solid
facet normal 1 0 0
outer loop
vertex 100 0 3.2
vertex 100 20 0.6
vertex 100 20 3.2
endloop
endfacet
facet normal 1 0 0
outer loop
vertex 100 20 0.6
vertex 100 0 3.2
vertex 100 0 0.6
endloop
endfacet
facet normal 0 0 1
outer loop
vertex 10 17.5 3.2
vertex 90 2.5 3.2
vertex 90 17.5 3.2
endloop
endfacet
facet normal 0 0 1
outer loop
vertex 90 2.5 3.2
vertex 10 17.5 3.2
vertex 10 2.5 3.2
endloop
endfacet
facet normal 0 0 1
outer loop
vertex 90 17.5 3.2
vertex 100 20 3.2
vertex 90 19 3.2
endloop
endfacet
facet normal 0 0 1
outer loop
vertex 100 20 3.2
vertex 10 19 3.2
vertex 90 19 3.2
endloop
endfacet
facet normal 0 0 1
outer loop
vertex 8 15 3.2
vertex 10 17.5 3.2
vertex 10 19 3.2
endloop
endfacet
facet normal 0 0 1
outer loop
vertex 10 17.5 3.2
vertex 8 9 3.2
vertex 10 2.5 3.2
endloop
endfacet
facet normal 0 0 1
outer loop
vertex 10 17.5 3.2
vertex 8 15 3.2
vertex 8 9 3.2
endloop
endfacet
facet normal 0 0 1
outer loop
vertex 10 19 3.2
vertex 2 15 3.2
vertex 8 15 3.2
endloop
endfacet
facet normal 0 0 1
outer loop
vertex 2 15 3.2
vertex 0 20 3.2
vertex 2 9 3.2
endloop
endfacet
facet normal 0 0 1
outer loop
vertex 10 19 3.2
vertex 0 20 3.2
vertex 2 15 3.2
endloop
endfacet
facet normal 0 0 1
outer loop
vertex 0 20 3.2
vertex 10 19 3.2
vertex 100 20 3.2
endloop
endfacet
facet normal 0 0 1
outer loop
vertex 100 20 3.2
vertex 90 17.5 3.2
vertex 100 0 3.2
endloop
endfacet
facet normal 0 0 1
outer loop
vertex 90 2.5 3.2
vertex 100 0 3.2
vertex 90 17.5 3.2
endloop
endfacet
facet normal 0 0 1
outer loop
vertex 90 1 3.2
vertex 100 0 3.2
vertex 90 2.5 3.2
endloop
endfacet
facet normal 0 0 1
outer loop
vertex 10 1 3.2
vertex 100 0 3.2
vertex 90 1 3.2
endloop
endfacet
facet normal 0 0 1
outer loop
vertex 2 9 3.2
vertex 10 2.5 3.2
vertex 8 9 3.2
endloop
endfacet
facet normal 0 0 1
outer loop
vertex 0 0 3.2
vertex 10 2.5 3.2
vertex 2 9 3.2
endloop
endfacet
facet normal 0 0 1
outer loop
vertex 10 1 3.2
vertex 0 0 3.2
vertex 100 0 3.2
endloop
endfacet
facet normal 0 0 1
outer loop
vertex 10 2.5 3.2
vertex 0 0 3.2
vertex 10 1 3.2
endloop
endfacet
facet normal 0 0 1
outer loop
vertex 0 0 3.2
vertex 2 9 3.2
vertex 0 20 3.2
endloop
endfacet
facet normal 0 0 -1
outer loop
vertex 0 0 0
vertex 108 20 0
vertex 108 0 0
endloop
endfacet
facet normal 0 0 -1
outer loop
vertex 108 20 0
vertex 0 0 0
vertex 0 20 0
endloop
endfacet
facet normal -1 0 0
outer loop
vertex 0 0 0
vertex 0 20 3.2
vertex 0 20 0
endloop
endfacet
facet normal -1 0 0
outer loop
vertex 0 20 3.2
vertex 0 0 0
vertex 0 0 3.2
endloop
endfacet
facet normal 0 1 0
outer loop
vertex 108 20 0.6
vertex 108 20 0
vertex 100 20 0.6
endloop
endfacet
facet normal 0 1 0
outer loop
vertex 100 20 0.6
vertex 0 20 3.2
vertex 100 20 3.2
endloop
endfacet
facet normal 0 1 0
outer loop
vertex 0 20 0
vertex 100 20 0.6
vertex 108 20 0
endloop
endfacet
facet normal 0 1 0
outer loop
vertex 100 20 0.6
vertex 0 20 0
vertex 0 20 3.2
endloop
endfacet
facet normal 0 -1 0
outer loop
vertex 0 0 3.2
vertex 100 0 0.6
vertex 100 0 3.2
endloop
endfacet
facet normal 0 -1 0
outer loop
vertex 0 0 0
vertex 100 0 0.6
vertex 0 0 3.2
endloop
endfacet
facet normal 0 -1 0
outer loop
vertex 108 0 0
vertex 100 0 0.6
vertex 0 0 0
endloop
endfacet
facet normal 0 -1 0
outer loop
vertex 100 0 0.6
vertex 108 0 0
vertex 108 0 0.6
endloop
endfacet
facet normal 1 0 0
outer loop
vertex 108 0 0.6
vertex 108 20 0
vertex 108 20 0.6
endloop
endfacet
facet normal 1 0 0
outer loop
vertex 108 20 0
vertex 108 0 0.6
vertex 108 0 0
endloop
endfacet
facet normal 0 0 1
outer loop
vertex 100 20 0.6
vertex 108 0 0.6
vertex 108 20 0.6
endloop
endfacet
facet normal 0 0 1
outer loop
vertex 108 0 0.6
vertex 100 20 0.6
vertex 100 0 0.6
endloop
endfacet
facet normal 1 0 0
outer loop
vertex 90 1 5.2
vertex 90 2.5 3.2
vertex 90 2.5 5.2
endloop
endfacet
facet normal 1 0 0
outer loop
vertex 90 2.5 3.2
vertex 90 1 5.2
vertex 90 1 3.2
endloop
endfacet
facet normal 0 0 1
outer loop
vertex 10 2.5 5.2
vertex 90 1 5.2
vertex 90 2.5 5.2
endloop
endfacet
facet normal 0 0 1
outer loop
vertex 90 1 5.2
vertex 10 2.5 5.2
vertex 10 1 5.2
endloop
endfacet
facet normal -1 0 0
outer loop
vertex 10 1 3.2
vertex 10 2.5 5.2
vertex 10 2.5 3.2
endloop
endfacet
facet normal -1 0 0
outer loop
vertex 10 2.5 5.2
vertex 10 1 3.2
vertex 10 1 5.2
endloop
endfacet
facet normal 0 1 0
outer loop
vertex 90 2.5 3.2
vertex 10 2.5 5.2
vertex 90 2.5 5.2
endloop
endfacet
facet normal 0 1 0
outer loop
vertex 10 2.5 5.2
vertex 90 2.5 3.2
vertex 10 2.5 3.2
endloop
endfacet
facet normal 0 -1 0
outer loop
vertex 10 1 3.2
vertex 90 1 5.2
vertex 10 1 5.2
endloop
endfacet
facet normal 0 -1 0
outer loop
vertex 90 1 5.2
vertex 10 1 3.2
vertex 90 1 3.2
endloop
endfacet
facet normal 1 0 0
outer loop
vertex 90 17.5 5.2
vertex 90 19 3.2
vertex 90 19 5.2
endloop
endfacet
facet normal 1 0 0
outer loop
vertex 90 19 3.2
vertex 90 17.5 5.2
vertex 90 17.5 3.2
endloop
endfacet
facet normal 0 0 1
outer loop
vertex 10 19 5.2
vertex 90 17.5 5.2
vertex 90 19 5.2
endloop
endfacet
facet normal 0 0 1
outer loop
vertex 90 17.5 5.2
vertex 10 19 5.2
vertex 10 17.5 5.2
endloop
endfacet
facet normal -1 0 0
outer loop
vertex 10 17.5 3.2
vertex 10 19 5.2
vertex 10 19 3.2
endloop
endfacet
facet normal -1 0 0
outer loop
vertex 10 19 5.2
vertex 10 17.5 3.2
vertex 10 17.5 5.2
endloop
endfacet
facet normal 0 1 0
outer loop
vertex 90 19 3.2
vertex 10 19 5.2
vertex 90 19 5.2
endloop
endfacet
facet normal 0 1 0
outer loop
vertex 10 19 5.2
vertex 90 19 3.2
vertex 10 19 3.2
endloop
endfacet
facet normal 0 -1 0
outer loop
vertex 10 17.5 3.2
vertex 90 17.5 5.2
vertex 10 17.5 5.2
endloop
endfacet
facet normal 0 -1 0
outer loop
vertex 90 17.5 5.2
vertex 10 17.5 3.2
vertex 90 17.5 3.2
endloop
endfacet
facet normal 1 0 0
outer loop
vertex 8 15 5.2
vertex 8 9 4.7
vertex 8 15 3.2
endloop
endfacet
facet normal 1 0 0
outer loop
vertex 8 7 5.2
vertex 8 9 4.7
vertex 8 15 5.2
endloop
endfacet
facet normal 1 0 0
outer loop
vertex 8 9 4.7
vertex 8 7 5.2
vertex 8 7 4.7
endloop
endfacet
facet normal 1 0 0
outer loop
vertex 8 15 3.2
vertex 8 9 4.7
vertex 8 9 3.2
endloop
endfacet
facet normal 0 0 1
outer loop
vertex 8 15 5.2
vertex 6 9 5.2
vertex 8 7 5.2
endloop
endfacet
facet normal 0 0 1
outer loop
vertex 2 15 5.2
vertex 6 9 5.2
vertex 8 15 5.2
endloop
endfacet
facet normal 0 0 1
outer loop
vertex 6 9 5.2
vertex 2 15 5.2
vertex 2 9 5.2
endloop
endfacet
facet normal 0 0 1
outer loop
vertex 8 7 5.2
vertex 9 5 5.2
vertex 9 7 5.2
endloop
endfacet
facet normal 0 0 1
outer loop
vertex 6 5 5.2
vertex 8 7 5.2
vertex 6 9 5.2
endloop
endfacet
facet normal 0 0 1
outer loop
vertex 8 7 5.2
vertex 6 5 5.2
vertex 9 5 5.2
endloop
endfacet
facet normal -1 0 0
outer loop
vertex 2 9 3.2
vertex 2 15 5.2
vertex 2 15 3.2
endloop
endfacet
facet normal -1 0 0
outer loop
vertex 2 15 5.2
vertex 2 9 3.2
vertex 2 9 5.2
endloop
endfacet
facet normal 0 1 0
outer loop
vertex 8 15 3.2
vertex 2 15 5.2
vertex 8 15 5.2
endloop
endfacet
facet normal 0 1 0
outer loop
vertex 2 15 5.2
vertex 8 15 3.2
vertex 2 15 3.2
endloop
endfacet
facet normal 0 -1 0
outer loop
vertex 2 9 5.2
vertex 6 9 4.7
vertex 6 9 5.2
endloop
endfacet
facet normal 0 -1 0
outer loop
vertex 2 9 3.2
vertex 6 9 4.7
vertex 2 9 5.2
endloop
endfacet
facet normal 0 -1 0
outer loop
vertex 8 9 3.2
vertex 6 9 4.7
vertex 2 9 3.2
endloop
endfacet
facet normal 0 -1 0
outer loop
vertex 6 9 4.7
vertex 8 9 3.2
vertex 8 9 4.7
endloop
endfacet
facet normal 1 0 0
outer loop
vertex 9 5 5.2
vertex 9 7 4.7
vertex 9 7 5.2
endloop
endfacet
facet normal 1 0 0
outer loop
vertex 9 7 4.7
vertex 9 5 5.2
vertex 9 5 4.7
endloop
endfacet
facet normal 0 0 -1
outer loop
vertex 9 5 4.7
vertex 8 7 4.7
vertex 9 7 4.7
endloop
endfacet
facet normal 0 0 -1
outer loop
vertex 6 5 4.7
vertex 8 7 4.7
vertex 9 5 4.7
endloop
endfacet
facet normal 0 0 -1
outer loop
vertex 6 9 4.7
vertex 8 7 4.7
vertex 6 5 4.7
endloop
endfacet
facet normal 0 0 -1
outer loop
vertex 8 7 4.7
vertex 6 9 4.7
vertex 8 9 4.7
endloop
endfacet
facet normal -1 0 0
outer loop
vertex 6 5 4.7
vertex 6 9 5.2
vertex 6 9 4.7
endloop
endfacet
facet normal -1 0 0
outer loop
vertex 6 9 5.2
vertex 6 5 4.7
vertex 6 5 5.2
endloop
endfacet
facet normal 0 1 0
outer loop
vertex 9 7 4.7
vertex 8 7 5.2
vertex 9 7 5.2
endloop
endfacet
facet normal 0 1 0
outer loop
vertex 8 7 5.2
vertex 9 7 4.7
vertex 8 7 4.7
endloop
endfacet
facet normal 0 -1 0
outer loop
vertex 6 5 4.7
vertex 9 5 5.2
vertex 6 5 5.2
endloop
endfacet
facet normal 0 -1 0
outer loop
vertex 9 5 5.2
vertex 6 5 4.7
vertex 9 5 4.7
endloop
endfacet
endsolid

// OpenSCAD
// Bag clip living hinge, PETG, 0.4 nozzle, no supports.
// Two halves contacting at hinge, open flat print pose.
// Fold: rotate upper 180 about [108,10,5.2] -Y. F(x)=216-x, F(z)=10.4-z.

part = "arm_lower"; // [arm_lower, arm_upper, assembly]
cadverify_only = "";

module instance(name, part, unit = 1) {
    echo(cadverify_instance = [name, part, unit]);
    if (cadverify_only == "" || cadverify_only == name) children();
}

module arm_lower() {
    cube([100, 20, 3.2], false);
    translate([99.9, 0, 0]) cube([8.1, 20, 0.6], false);
    translate([10, 1, 3.1]) cube([80, 1.5, 2.1], false);
    translate([10, 17.5, 3.1]) cube([80, 1.5, 2.1], false);
    // stop tower (central)
    translate([2, 9, 3.1]) cube([6, 6, 2.1], false);
    // lower hook base region uses body; hook lip + bridge
    translate([6, 5, 4.7]) cube([3, 2, 0.5], false);
    translate([6, 6.9, 4.7]) cube([2, 2.2, 0.5], false);
}

module arm_upper() {
    cube([8.2, 20, 0.6], false);
    translate([7.9, 0, 0]) cube([100.1, 20, 3.2], false);
    // stop tower (central) local x 102-106 -> folded 2-6
    translate([102, 9, 3.1]) cube([4, 6, 2.1], false);
    // upper hook post (Y 13-15) tall
    translate([102, 13, 3.1]) cube([4, 2, 3.3], false);
    // Y bridge 7-13
    translate([99, 6.9, 5.8]) cube([3.1, 6.2, 0.6], false);
    // upper hook lip (Y 5-7)
    translate([99, 5, 5.8]) cube([3.1, 2, 0.6], false);
    // thumb tab
    translate([107.9, 6, 0]) cube([8.1, 8, 3.2], false);
}

if (part == "arm_lower") {
    echo(cadverify_spec = [
        ["bounds", [[0, 0, 0], [108, 20, 5.2]]],
        ["bodies", 1],
        ["through_holes", 0],
        ["support_faces", [["bed", "-z", 1500]]],
        ["overhangs_allowed", [["latch lip", [[5.5, 4.5, 4.5], [9.5, 9.5, 5.5]]]]],
        ["copies", 1],
        ["details", [
            ["arm", "material", [[30, 10, 1.2], [70, 12, 2.0]], 1],
            ["arm_wall", "thickness", [50, 10, 10], [0, 0, -1], 3.2],
            ["hinge", "thickness", [104, 10, 5], [0, 0, -1], 0.6],
            ["rib", "material", [[30, 1.3, 3.8], [70, 2.2, 4.8]], 1],
            ["rib2", "material", [[30, 17.8, 3.8], [70, 18.7, 4.8]], 1],
            ["latch_tower", "material", [[3, 10, 3.8], [7, 14, 5.0]], 1],
            ["latch_lip", "material", [[6.5, 5.5, 4.8], [8.5, 6.5, 5.1]], 1],
            ["bag_slot", "void", [[30, 4, 3.8], [70, 16, 5.0]], 1]
        ]]
    ]);
    arm_lower();
} else if (part == "arm_upper") {
    echo(cadverify_spec = [
        ["bounds", [[0, 0, 0], [116, 20, 6.4]]],
        ["bodies", 1],
        ["through_holes", 0],
        ["support_faces", [["bed", "-z", 1500]]],
        ["overhangs_allowed", [["latch lip", [[98.5, 4.5, 5.6], [102.5, 13.5, 6.6]]]]],
        ["copies", 1],
        ["details", [
            ["arm", "material", [[30, 10, 1.2], [70, 12, 2.0]], 1],
            ["arm_wall", "thickness", [50, 10, 10], [0, 0, -1], 3.2],
            ["hinge", "thickness", [4, 10, 5], [0, 0, -1], 0.6],
            ["latch_tower", "material", [[102.5, 10, 3.8], [105.5, 14, 5.0]], 1],
            ["latch_lip", "material", [[99.5, 5.5, 5.9], [101.5, 6.5, 6.3]], 0.99],
            ["thumb_tab", "material", [[109, 7, 1.2], [114, 13, 2.0]], 0.99],
            ["field", "void", [[30, 4, 3.8], [70, 16, 5.0]], 1]
        ]]
    ]);
    arm_upper();
} else if (part == "assembly") {
    echo(cadverify_spec = [
        ["bounds", [[0, 0, 0], [224.0, 20, 6.4]]],
        ["support_faces", [["bed", "-z", 3000]]],
        ["motions", [
            ["close", ["upper"], "rotate", [108, 10, 5.2], [0, -1, 0], [0, 180],
                ["stops", [180]]
            ]
        ]],
        ["assembly_order", [
            [["lower"], [0, 0, 0]],
            [["upper"], [0, 0, -1]]
        ]]
    ]);
    instance("lower", "arm_lower") arm_lower();
    instance("upper", "arm_upper") translate([108, 0, 0]) arm_upper();
}
